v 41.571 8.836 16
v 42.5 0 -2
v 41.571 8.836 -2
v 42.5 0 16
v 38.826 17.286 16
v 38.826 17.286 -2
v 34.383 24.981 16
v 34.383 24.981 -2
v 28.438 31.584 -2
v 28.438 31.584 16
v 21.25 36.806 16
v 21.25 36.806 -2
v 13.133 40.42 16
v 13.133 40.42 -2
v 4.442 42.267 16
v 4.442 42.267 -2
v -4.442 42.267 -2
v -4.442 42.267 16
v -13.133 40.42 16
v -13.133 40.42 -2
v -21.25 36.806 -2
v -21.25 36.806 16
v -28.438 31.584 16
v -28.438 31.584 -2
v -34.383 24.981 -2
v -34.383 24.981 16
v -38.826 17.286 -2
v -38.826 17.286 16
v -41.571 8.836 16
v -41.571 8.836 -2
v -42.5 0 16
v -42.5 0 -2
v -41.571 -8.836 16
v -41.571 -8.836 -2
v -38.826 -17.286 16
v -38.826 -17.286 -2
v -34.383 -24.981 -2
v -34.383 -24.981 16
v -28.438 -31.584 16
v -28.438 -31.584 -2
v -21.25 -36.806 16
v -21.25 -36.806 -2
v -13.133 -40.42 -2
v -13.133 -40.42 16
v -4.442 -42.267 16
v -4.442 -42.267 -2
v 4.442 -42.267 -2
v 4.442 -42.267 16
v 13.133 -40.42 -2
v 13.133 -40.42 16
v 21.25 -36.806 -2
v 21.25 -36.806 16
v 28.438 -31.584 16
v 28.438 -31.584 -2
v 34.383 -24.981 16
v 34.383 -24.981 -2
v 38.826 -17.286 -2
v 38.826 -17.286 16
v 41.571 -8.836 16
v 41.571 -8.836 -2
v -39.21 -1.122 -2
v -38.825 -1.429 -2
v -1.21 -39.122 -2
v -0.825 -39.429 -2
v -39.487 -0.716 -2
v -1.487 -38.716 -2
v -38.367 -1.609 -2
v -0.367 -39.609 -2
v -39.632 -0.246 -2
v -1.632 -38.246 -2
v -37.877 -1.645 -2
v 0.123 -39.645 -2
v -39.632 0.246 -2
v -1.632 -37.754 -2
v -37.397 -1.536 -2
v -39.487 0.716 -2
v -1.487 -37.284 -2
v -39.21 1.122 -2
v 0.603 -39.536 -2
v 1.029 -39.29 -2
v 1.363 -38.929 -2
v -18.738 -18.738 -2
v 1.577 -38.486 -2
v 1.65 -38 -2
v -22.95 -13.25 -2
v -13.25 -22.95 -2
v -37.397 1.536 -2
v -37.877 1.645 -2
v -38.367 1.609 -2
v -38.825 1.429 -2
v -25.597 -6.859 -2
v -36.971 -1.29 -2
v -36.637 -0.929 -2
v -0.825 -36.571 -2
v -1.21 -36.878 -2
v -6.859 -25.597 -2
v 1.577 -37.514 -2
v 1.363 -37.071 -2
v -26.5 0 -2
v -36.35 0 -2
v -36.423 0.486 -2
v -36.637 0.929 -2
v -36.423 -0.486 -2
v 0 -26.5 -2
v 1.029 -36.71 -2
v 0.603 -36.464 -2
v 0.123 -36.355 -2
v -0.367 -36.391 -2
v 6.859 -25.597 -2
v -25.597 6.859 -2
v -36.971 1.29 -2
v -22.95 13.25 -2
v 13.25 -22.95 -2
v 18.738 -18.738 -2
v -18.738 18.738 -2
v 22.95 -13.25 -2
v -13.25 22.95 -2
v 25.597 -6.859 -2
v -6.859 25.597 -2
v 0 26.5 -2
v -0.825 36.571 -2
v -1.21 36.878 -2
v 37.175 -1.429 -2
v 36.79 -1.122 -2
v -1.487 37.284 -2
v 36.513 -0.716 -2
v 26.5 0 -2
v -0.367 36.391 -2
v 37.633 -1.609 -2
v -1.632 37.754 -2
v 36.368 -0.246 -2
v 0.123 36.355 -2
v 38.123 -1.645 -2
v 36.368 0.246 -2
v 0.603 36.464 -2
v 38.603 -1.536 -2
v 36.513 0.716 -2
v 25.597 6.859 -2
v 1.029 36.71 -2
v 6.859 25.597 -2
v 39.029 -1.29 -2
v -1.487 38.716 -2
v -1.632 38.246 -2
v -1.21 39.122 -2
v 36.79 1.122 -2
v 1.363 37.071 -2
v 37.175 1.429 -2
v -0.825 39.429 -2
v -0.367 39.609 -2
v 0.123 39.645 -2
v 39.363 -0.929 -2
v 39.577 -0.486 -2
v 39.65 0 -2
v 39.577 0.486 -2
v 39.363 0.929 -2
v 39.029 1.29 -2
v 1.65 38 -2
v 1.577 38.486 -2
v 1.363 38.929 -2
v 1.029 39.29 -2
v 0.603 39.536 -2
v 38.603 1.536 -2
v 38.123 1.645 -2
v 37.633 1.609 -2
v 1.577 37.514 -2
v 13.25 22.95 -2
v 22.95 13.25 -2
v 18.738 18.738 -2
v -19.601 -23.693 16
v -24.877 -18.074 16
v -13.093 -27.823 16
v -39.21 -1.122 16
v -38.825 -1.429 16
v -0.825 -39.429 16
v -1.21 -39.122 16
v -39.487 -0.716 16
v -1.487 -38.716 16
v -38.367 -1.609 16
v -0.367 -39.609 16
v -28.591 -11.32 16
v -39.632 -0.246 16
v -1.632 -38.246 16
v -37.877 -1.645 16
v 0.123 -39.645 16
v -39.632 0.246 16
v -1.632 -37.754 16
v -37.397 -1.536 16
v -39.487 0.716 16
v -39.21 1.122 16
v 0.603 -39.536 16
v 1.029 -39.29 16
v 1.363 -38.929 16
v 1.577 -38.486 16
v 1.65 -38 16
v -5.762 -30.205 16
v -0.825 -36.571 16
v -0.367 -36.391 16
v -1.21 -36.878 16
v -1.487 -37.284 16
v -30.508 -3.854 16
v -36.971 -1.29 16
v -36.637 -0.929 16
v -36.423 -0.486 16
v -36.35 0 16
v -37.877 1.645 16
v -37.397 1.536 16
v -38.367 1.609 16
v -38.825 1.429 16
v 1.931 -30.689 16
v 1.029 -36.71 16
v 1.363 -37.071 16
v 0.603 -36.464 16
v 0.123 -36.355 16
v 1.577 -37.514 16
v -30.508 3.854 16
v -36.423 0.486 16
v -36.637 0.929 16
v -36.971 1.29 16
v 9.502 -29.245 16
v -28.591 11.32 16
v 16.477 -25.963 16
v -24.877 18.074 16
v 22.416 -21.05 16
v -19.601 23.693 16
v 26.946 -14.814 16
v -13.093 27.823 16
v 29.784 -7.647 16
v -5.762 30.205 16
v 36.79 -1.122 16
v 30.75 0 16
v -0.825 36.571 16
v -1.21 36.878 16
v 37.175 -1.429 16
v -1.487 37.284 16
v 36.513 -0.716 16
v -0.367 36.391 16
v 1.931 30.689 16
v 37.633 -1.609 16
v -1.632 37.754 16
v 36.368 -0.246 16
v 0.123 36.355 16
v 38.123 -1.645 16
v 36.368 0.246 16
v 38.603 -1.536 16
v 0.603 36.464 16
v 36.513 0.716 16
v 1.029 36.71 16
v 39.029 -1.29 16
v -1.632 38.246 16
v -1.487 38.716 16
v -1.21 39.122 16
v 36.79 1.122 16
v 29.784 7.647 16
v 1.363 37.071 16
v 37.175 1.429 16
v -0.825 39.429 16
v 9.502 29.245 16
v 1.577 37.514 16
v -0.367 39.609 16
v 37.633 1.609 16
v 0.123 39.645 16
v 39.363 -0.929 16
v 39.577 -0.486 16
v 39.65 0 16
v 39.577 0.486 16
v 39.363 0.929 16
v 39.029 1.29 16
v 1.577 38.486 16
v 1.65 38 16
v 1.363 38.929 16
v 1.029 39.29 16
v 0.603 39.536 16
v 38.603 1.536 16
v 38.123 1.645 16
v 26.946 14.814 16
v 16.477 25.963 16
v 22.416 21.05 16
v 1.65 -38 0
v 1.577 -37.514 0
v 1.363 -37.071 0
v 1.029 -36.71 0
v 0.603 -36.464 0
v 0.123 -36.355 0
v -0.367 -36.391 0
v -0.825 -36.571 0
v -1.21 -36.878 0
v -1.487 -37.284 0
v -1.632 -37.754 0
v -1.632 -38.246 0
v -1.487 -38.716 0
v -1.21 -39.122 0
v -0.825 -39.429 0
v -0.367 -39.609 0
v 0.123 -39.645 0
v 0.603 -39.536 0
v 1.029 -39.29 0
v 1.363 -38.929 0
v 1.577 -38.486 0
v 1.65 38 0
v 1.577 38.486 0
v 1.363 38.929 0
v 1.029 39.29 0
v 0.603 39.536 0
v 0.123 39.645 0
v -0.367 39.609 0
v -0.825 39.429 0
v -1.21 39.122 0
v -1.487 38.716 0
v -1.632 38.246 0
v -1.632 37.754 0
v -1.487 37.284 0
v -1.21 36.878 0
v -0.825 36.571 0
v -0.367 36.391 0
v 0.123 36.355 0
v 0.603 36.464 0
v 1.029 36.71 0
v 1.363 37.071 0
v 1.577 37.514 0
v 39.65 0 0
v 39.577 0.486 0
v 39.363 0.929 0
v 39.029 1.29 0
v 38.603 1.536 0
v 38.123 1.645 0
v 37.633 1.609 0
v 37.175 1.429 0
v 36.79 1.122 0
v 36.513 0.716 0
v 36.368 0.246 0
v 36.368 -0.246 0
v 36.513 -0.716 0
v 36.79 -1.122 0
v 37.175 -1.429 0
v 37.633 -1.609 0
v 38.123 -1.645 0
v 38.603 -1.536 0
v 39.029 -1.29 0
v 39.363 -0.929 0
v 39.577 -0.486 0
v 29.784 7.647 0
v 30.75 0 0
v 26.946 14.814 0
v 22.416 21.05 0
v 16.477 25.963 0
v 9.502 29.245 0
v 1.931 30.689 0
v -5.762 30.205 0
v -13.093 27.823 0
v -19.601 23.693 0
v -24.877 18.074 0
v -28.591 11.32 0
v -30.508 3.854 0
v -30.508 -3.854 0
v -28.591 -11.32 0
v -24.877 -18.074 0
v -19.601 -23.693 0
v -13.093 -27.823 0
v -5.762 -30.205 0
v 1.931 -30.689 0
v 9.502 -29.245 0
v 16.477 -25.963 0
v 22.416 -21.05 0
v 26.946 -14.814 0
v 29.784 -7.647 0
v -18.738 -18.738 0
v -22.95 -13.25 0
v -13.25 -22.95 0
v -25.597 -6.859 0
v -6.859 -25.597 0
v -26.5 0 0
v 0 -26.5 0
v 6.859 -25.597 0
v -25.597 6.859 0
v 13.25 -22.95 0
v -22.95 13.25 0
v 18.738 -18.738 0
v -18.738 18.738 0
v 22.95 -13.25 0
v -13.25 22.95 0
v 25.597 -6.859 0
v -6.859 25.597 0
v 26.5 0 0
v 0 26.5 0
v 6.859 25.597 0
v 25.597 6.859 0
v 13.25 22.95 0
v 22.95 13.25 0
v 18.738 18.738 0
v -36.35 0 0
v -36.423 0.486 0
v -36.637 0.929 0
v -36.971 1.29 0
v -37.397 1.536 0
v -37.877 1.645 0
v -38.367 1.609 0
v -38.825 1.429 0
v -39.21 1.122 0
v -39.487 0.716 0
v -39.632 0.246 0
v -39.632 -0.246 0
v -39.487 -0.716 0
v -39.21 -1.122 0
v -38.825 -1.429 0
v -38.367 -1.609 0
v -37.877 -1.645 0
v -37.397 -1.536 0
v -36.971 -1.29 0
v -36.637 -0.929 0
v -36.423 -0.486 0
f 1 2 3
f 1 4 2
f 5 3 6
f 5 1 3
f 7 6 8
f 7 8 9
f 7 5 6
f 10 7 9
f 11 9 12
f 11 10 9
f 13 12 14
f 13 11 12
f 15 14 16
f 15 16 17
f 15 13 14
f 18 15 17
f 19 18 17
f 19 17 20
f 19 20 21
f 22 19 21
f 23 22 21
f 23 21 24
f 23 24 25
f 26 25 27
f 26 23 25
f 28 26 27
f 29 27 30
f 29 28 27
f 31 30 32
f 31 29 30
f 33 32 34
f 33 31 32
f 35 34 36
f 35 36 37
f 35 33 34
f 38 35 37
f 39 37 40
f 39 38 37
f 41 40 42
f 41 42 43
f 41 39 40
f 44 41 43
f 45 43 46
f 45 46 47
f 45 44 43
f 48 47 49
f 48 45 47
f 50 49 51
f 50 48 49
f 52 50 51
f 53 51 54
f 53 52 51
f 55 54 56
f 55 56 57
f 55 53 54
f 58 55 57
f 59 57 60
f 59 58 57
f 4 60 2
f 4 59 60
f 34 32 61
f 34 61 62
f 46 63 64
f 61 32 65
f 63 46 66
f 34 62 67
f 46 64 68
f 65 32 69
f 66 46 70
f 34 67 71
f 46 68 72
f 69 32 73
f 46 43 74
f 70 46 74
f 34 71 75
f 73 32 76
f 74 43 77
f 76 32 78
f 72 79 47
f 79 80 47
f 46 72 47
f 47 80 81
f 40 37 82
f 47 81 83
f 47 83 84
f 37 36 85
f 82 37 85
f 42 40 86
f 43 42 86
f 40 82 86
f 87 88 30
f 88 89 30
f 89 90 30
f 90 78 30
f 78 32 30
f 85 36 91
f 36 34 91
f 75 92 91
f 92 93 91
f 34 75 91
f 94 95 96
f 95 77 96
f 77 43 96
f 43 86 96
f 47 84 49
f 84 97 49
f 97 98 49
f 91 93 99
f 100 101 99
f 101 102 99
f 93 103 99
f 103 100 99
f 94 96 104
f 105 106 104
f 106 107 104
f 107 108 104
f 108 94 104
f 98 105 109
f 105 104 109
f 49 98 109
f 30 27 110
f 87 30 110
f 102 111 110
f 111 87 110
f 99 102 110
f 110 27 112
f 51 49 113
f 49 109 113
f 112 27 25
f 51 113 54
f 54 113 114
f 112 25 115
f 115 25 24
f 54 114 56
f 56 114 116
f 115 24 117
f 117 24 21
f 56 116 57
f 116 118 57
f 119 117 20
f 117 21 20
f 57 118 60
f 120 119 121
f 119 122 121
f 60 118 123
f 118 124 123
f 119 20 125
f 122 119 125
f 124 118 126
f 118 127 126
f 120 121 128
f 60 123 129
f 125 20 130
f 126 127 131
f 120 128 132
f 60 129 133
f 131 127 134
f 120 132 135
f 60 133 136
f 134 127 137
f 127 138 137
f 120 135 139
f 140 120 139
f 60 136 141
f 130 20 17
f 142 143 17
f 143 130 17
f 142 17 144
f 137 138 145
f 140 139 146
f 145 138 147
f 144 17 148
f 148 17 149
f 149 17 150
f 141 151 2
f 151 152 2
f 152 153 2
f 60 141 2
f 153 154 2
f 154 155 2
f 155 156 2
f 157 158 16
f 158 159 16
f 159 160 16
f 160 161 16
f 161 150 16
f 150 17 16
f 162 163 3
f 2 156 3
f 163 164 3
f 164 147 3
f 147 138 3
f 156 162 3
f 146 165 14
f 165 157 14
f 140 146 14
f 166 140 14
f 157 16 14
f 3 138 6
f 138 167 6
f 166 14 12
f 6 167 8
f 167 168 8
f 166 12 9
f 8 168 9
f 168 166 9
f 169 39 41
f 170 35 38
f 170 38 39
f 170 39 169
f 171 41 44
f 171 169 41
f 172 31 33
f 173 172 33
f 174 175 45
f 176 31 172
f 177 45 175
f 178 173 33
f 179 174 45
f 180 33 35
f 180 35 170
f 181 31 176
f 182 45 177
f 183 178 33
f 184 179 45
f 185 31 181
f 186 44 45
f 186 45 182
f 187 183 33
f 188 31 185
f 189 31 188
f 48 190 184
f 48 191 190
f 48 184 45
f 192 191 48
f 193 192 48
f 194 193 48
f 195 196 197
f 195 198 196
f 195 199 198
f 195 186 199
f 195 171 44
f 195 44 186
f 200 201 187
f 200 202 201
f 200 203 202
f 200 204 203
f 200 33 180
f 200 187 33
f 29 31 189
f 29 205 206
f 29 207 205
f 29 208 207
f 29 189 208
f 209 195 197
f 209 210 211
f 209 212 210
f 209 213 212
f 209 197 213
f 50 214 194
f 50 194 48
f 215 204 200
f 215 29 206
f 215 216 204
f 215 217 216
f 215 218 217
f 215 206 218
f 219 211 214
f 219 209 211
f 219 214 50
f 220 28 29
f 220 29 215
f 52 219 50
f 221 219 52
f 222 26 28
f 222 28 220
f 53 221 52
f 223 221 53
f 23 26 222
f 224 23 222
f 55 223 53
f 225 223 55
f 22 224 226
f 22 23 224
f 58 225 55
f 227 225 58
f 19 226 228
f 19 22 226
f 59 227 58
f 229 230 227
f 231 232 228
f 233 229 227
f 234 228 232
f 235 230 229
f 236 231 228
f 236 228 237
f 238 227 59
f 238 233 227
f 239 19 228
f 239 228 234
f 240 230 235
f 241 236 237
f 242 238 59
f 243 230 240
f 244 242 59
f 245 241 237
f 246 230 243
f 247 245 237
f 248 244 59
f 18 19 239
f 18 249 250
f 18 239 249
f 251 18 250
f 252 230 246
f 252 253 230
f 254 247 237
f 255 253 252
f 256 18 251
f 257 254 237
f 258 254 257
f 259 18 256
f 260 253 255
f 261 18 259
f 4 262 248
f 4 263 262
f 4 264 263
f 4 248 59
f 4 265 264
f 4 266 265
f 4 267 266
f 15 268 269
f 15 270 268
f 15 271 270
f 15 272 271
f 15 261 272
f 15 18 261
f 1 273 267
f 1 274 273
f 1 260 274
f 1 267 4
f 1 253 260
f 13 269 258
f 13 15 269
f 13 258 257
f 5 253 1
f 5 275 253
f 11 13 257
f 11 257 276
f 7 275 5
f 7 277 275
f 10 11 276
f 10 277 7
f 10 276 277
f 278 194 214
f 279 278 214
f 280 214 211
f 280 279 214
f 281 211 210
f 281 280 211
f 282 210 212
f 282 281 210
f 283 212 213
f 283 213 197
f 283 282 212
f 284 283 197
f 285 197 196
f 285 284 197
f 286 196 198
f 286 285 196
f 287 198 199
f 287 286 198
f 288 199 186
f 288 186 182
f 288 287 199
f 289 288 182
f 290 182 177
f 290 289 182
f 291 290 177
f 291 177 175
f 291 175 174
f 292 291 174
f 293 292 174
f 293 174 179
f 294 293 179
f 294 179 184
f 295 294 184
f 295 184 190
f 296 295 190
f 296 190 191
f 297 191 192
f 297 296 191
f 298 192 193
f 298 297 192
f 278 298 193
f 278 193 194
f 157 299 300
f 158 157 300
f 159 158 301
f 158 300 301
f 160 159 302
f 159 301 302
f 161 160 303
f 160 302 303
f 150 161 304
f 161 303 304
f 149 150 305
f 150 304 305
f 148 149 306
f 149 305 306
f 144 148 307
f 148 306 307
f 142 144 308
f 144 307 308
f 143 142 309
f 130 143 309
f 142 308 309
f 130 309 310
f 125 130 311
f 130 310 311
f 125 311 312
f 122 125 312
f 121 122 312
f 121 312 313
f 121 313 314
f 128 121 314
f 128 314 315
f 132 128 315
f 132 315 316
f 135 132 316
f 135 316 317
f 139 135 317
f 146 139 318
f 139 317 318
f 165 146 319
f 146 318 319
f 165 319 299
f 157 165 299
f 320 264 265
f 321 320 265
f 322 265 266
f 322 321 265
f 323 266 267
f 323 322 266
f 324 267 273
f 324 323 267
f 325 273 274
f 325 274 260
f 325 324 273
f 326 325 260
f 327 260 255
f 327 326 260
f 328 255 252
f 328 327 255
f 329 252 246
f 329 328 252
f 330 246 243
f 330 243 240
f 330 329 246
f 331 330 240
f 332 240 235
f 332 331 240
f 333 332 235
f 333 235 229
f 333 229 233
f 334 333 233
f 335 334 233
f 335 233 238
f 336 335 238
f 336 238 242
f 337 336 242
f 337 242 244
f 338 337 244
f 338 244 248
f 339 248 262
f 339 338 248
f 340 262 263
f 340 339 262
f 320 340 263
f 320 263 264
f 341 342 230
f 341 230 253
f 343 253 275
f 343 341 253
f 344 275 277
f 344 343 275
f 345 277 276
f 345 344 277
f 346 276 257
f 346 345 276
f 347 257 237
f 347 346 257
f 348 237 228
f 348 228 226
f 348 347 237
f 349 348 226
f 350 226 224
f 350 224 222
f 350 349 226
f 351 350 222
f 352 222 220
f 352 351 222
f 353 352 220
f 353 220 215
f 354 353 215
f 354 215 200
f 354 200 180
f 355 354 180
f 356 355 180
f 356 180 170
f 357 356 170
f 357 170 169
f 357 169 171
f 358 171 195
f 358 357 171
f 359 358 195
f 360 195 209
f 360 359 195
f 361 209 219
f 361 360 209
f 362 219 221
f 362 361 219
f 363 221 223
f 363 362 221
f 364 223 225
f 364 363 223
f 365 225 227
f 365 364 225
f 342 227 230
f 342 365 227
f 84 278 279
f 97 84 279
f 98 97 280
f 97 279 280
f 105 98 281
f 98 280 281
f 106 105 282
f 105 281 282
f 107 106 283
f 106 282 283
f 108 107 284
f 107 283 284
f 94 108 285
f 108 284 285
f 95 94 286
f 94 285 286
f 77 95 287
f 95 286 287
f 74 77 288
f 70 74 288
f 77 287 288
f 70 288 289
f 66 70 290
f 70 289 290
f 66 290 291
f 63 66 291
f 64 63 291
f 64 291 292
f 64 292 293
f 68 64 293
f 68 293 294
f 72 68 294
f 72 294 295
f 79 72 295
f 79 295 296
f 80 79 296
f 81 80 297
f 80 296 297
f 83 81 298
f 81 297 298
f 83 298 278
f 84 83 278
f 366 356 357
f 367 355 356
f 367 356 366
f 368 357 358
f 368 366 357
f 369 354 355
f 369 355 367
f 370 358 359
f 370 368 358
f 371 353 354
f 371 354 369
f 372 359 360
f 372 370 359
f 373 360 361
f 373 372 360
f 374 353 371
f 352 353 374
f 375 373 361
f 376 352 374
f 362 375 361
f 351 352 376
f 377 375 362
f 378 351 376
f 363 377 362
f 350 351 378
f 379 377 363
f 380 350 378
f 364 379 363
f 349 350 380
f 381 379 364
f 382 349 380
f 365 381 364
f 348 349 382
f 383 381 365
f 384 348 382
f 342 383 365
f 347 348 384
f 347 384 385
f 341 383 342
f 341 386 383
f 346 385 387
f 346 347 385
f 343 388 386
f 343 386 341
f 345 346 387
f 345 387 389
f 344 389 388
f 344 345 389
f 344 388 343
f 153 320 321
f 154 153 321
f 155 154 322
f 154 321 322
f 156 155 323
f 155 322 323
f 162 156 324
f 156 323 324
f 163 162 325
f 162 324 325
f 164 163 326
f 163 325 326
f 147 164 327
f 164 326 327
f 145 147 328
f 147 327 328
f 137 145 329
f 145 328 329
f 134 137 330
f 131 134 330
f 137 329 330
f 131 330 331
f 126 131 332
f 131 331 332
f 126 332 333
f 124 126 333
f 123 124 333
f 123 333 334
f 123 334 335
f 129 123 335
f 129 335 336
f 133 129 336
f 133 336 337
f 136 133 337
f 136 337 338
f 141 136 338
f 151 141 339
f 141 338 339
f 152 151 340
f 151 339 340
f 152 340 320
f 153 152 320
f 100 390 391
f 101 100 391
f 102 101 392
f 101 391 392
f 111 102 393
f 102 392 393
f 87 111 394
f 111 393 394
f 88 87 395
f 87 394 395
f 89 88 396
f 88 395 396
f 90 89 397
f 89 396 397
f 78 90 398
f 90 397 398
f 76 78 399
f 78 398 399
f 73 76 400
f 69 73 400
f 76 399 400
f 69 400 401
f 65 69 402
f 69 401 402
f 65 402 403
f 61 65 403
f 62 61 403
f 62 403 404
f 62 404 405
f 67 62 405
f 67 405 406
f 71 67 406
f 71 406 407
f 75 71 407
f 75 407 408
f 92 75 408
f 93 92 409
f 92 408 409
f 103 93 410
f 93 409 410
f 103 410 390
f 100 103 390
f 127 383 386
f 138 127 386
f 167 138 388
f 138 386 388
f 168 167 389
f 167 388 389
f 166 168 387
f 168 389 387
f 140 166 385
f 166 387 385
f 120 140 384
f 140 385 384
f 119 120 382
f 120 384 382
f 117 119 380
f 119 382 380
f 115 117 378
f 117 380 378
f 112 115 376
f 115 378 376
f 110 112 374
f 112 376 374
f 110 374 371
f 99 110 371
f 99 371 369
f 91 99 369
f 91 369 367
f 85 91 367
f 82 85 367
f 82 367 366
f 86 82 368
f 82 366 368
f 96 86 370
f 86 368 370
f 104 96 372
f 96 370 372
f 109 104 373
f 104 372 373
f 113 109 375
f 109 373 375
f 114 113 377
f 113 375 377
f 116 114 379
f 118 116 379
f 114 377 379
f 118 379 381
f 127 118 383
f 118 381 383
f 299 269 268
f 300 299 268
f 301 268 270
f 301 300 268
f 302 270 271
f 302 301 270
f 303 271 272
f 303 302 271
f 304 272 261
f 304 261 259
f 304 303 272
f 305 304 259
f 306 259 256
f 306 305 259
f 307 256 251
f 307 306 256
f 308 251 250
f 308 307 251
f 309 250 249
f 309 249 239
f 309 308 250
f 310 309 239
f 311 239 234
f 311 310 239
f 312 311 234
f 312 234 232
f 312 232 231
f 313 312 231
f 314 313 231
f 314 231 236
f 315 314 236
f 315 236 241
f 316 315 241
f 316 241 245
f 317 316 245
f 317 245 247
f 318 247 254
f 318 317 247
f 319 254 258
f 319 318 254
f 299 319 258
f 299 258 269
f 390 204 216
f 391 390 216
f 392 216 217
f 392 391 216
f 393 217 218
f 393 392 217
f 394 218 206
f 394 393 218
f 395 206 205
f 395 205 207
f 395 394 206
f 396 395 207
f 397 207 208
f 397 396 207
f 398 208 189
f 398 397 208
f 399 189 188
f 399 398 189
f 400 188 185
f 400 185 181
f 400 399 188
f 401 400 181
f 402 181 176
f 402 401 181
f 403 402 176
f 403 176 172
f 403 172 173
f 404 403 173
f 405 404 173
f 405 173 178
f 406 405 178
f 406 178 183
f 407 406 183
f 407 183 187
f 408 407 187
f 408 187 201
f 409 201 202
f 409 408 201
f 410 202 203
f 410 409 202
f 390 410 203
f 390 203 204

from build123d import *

# Parameters (mm, degrees)
F0_R     = 42.5
F0_R_2   = 1.65
F0_R_3   = 30.75
F1_DEPTH = 16
F2_R     = 42.5
F2_R_2   = 1.65
F2_R_3   = 26.5
F3_DEPTH = 2


with BuildPart() as f1:
    # F0 (on Top) → F1 (new body)
    with BuildSketch(Plane.XY):
        Circle(F0_R)
        with Locations((0, -38)):
            Circle(F0_R_2, mode=Mode.SUBTRACT)
        with Locations((-38, 0)):
            Circle(F0_R_2, mode=Mode.SUBTRACT)
        Circle(F0_R_3, mode=Mode.SUBTRACT)
        with Locations((38, 0)):
            Circle(F0_R_2, mode=Mode.SUBTRACT)
        with Locations((0, 38)):
            Circle(F0_R_2, mode=Mode.SUBTRACT)
    extrude(amount=F1_DEPTH)

    # F2 (on Top) → F3 (join)
    with BuildSketch(Plane.XY):
        Circle(F2_R)
        with Locations((0, -38)):
            Circle(F2_R_2, mode=Mode.SUBTRACT)
        with Locations((-38, 0)):
            Circle(F2_R_2, mode=Mode.SUBTRACT)
        Circle(F2_R_3, mode=Mode.SUBTRACT)
        with Locations((38, 0)):
            Circle(F2_R_2, mode=Mode.SUBTRACT)
        with Locations((0, 38)):
            Circle(F2_R_2, mode=Mode.SUBTRACT)
    extrude(amount=-F3_DEPTH)


solid = f1.part
